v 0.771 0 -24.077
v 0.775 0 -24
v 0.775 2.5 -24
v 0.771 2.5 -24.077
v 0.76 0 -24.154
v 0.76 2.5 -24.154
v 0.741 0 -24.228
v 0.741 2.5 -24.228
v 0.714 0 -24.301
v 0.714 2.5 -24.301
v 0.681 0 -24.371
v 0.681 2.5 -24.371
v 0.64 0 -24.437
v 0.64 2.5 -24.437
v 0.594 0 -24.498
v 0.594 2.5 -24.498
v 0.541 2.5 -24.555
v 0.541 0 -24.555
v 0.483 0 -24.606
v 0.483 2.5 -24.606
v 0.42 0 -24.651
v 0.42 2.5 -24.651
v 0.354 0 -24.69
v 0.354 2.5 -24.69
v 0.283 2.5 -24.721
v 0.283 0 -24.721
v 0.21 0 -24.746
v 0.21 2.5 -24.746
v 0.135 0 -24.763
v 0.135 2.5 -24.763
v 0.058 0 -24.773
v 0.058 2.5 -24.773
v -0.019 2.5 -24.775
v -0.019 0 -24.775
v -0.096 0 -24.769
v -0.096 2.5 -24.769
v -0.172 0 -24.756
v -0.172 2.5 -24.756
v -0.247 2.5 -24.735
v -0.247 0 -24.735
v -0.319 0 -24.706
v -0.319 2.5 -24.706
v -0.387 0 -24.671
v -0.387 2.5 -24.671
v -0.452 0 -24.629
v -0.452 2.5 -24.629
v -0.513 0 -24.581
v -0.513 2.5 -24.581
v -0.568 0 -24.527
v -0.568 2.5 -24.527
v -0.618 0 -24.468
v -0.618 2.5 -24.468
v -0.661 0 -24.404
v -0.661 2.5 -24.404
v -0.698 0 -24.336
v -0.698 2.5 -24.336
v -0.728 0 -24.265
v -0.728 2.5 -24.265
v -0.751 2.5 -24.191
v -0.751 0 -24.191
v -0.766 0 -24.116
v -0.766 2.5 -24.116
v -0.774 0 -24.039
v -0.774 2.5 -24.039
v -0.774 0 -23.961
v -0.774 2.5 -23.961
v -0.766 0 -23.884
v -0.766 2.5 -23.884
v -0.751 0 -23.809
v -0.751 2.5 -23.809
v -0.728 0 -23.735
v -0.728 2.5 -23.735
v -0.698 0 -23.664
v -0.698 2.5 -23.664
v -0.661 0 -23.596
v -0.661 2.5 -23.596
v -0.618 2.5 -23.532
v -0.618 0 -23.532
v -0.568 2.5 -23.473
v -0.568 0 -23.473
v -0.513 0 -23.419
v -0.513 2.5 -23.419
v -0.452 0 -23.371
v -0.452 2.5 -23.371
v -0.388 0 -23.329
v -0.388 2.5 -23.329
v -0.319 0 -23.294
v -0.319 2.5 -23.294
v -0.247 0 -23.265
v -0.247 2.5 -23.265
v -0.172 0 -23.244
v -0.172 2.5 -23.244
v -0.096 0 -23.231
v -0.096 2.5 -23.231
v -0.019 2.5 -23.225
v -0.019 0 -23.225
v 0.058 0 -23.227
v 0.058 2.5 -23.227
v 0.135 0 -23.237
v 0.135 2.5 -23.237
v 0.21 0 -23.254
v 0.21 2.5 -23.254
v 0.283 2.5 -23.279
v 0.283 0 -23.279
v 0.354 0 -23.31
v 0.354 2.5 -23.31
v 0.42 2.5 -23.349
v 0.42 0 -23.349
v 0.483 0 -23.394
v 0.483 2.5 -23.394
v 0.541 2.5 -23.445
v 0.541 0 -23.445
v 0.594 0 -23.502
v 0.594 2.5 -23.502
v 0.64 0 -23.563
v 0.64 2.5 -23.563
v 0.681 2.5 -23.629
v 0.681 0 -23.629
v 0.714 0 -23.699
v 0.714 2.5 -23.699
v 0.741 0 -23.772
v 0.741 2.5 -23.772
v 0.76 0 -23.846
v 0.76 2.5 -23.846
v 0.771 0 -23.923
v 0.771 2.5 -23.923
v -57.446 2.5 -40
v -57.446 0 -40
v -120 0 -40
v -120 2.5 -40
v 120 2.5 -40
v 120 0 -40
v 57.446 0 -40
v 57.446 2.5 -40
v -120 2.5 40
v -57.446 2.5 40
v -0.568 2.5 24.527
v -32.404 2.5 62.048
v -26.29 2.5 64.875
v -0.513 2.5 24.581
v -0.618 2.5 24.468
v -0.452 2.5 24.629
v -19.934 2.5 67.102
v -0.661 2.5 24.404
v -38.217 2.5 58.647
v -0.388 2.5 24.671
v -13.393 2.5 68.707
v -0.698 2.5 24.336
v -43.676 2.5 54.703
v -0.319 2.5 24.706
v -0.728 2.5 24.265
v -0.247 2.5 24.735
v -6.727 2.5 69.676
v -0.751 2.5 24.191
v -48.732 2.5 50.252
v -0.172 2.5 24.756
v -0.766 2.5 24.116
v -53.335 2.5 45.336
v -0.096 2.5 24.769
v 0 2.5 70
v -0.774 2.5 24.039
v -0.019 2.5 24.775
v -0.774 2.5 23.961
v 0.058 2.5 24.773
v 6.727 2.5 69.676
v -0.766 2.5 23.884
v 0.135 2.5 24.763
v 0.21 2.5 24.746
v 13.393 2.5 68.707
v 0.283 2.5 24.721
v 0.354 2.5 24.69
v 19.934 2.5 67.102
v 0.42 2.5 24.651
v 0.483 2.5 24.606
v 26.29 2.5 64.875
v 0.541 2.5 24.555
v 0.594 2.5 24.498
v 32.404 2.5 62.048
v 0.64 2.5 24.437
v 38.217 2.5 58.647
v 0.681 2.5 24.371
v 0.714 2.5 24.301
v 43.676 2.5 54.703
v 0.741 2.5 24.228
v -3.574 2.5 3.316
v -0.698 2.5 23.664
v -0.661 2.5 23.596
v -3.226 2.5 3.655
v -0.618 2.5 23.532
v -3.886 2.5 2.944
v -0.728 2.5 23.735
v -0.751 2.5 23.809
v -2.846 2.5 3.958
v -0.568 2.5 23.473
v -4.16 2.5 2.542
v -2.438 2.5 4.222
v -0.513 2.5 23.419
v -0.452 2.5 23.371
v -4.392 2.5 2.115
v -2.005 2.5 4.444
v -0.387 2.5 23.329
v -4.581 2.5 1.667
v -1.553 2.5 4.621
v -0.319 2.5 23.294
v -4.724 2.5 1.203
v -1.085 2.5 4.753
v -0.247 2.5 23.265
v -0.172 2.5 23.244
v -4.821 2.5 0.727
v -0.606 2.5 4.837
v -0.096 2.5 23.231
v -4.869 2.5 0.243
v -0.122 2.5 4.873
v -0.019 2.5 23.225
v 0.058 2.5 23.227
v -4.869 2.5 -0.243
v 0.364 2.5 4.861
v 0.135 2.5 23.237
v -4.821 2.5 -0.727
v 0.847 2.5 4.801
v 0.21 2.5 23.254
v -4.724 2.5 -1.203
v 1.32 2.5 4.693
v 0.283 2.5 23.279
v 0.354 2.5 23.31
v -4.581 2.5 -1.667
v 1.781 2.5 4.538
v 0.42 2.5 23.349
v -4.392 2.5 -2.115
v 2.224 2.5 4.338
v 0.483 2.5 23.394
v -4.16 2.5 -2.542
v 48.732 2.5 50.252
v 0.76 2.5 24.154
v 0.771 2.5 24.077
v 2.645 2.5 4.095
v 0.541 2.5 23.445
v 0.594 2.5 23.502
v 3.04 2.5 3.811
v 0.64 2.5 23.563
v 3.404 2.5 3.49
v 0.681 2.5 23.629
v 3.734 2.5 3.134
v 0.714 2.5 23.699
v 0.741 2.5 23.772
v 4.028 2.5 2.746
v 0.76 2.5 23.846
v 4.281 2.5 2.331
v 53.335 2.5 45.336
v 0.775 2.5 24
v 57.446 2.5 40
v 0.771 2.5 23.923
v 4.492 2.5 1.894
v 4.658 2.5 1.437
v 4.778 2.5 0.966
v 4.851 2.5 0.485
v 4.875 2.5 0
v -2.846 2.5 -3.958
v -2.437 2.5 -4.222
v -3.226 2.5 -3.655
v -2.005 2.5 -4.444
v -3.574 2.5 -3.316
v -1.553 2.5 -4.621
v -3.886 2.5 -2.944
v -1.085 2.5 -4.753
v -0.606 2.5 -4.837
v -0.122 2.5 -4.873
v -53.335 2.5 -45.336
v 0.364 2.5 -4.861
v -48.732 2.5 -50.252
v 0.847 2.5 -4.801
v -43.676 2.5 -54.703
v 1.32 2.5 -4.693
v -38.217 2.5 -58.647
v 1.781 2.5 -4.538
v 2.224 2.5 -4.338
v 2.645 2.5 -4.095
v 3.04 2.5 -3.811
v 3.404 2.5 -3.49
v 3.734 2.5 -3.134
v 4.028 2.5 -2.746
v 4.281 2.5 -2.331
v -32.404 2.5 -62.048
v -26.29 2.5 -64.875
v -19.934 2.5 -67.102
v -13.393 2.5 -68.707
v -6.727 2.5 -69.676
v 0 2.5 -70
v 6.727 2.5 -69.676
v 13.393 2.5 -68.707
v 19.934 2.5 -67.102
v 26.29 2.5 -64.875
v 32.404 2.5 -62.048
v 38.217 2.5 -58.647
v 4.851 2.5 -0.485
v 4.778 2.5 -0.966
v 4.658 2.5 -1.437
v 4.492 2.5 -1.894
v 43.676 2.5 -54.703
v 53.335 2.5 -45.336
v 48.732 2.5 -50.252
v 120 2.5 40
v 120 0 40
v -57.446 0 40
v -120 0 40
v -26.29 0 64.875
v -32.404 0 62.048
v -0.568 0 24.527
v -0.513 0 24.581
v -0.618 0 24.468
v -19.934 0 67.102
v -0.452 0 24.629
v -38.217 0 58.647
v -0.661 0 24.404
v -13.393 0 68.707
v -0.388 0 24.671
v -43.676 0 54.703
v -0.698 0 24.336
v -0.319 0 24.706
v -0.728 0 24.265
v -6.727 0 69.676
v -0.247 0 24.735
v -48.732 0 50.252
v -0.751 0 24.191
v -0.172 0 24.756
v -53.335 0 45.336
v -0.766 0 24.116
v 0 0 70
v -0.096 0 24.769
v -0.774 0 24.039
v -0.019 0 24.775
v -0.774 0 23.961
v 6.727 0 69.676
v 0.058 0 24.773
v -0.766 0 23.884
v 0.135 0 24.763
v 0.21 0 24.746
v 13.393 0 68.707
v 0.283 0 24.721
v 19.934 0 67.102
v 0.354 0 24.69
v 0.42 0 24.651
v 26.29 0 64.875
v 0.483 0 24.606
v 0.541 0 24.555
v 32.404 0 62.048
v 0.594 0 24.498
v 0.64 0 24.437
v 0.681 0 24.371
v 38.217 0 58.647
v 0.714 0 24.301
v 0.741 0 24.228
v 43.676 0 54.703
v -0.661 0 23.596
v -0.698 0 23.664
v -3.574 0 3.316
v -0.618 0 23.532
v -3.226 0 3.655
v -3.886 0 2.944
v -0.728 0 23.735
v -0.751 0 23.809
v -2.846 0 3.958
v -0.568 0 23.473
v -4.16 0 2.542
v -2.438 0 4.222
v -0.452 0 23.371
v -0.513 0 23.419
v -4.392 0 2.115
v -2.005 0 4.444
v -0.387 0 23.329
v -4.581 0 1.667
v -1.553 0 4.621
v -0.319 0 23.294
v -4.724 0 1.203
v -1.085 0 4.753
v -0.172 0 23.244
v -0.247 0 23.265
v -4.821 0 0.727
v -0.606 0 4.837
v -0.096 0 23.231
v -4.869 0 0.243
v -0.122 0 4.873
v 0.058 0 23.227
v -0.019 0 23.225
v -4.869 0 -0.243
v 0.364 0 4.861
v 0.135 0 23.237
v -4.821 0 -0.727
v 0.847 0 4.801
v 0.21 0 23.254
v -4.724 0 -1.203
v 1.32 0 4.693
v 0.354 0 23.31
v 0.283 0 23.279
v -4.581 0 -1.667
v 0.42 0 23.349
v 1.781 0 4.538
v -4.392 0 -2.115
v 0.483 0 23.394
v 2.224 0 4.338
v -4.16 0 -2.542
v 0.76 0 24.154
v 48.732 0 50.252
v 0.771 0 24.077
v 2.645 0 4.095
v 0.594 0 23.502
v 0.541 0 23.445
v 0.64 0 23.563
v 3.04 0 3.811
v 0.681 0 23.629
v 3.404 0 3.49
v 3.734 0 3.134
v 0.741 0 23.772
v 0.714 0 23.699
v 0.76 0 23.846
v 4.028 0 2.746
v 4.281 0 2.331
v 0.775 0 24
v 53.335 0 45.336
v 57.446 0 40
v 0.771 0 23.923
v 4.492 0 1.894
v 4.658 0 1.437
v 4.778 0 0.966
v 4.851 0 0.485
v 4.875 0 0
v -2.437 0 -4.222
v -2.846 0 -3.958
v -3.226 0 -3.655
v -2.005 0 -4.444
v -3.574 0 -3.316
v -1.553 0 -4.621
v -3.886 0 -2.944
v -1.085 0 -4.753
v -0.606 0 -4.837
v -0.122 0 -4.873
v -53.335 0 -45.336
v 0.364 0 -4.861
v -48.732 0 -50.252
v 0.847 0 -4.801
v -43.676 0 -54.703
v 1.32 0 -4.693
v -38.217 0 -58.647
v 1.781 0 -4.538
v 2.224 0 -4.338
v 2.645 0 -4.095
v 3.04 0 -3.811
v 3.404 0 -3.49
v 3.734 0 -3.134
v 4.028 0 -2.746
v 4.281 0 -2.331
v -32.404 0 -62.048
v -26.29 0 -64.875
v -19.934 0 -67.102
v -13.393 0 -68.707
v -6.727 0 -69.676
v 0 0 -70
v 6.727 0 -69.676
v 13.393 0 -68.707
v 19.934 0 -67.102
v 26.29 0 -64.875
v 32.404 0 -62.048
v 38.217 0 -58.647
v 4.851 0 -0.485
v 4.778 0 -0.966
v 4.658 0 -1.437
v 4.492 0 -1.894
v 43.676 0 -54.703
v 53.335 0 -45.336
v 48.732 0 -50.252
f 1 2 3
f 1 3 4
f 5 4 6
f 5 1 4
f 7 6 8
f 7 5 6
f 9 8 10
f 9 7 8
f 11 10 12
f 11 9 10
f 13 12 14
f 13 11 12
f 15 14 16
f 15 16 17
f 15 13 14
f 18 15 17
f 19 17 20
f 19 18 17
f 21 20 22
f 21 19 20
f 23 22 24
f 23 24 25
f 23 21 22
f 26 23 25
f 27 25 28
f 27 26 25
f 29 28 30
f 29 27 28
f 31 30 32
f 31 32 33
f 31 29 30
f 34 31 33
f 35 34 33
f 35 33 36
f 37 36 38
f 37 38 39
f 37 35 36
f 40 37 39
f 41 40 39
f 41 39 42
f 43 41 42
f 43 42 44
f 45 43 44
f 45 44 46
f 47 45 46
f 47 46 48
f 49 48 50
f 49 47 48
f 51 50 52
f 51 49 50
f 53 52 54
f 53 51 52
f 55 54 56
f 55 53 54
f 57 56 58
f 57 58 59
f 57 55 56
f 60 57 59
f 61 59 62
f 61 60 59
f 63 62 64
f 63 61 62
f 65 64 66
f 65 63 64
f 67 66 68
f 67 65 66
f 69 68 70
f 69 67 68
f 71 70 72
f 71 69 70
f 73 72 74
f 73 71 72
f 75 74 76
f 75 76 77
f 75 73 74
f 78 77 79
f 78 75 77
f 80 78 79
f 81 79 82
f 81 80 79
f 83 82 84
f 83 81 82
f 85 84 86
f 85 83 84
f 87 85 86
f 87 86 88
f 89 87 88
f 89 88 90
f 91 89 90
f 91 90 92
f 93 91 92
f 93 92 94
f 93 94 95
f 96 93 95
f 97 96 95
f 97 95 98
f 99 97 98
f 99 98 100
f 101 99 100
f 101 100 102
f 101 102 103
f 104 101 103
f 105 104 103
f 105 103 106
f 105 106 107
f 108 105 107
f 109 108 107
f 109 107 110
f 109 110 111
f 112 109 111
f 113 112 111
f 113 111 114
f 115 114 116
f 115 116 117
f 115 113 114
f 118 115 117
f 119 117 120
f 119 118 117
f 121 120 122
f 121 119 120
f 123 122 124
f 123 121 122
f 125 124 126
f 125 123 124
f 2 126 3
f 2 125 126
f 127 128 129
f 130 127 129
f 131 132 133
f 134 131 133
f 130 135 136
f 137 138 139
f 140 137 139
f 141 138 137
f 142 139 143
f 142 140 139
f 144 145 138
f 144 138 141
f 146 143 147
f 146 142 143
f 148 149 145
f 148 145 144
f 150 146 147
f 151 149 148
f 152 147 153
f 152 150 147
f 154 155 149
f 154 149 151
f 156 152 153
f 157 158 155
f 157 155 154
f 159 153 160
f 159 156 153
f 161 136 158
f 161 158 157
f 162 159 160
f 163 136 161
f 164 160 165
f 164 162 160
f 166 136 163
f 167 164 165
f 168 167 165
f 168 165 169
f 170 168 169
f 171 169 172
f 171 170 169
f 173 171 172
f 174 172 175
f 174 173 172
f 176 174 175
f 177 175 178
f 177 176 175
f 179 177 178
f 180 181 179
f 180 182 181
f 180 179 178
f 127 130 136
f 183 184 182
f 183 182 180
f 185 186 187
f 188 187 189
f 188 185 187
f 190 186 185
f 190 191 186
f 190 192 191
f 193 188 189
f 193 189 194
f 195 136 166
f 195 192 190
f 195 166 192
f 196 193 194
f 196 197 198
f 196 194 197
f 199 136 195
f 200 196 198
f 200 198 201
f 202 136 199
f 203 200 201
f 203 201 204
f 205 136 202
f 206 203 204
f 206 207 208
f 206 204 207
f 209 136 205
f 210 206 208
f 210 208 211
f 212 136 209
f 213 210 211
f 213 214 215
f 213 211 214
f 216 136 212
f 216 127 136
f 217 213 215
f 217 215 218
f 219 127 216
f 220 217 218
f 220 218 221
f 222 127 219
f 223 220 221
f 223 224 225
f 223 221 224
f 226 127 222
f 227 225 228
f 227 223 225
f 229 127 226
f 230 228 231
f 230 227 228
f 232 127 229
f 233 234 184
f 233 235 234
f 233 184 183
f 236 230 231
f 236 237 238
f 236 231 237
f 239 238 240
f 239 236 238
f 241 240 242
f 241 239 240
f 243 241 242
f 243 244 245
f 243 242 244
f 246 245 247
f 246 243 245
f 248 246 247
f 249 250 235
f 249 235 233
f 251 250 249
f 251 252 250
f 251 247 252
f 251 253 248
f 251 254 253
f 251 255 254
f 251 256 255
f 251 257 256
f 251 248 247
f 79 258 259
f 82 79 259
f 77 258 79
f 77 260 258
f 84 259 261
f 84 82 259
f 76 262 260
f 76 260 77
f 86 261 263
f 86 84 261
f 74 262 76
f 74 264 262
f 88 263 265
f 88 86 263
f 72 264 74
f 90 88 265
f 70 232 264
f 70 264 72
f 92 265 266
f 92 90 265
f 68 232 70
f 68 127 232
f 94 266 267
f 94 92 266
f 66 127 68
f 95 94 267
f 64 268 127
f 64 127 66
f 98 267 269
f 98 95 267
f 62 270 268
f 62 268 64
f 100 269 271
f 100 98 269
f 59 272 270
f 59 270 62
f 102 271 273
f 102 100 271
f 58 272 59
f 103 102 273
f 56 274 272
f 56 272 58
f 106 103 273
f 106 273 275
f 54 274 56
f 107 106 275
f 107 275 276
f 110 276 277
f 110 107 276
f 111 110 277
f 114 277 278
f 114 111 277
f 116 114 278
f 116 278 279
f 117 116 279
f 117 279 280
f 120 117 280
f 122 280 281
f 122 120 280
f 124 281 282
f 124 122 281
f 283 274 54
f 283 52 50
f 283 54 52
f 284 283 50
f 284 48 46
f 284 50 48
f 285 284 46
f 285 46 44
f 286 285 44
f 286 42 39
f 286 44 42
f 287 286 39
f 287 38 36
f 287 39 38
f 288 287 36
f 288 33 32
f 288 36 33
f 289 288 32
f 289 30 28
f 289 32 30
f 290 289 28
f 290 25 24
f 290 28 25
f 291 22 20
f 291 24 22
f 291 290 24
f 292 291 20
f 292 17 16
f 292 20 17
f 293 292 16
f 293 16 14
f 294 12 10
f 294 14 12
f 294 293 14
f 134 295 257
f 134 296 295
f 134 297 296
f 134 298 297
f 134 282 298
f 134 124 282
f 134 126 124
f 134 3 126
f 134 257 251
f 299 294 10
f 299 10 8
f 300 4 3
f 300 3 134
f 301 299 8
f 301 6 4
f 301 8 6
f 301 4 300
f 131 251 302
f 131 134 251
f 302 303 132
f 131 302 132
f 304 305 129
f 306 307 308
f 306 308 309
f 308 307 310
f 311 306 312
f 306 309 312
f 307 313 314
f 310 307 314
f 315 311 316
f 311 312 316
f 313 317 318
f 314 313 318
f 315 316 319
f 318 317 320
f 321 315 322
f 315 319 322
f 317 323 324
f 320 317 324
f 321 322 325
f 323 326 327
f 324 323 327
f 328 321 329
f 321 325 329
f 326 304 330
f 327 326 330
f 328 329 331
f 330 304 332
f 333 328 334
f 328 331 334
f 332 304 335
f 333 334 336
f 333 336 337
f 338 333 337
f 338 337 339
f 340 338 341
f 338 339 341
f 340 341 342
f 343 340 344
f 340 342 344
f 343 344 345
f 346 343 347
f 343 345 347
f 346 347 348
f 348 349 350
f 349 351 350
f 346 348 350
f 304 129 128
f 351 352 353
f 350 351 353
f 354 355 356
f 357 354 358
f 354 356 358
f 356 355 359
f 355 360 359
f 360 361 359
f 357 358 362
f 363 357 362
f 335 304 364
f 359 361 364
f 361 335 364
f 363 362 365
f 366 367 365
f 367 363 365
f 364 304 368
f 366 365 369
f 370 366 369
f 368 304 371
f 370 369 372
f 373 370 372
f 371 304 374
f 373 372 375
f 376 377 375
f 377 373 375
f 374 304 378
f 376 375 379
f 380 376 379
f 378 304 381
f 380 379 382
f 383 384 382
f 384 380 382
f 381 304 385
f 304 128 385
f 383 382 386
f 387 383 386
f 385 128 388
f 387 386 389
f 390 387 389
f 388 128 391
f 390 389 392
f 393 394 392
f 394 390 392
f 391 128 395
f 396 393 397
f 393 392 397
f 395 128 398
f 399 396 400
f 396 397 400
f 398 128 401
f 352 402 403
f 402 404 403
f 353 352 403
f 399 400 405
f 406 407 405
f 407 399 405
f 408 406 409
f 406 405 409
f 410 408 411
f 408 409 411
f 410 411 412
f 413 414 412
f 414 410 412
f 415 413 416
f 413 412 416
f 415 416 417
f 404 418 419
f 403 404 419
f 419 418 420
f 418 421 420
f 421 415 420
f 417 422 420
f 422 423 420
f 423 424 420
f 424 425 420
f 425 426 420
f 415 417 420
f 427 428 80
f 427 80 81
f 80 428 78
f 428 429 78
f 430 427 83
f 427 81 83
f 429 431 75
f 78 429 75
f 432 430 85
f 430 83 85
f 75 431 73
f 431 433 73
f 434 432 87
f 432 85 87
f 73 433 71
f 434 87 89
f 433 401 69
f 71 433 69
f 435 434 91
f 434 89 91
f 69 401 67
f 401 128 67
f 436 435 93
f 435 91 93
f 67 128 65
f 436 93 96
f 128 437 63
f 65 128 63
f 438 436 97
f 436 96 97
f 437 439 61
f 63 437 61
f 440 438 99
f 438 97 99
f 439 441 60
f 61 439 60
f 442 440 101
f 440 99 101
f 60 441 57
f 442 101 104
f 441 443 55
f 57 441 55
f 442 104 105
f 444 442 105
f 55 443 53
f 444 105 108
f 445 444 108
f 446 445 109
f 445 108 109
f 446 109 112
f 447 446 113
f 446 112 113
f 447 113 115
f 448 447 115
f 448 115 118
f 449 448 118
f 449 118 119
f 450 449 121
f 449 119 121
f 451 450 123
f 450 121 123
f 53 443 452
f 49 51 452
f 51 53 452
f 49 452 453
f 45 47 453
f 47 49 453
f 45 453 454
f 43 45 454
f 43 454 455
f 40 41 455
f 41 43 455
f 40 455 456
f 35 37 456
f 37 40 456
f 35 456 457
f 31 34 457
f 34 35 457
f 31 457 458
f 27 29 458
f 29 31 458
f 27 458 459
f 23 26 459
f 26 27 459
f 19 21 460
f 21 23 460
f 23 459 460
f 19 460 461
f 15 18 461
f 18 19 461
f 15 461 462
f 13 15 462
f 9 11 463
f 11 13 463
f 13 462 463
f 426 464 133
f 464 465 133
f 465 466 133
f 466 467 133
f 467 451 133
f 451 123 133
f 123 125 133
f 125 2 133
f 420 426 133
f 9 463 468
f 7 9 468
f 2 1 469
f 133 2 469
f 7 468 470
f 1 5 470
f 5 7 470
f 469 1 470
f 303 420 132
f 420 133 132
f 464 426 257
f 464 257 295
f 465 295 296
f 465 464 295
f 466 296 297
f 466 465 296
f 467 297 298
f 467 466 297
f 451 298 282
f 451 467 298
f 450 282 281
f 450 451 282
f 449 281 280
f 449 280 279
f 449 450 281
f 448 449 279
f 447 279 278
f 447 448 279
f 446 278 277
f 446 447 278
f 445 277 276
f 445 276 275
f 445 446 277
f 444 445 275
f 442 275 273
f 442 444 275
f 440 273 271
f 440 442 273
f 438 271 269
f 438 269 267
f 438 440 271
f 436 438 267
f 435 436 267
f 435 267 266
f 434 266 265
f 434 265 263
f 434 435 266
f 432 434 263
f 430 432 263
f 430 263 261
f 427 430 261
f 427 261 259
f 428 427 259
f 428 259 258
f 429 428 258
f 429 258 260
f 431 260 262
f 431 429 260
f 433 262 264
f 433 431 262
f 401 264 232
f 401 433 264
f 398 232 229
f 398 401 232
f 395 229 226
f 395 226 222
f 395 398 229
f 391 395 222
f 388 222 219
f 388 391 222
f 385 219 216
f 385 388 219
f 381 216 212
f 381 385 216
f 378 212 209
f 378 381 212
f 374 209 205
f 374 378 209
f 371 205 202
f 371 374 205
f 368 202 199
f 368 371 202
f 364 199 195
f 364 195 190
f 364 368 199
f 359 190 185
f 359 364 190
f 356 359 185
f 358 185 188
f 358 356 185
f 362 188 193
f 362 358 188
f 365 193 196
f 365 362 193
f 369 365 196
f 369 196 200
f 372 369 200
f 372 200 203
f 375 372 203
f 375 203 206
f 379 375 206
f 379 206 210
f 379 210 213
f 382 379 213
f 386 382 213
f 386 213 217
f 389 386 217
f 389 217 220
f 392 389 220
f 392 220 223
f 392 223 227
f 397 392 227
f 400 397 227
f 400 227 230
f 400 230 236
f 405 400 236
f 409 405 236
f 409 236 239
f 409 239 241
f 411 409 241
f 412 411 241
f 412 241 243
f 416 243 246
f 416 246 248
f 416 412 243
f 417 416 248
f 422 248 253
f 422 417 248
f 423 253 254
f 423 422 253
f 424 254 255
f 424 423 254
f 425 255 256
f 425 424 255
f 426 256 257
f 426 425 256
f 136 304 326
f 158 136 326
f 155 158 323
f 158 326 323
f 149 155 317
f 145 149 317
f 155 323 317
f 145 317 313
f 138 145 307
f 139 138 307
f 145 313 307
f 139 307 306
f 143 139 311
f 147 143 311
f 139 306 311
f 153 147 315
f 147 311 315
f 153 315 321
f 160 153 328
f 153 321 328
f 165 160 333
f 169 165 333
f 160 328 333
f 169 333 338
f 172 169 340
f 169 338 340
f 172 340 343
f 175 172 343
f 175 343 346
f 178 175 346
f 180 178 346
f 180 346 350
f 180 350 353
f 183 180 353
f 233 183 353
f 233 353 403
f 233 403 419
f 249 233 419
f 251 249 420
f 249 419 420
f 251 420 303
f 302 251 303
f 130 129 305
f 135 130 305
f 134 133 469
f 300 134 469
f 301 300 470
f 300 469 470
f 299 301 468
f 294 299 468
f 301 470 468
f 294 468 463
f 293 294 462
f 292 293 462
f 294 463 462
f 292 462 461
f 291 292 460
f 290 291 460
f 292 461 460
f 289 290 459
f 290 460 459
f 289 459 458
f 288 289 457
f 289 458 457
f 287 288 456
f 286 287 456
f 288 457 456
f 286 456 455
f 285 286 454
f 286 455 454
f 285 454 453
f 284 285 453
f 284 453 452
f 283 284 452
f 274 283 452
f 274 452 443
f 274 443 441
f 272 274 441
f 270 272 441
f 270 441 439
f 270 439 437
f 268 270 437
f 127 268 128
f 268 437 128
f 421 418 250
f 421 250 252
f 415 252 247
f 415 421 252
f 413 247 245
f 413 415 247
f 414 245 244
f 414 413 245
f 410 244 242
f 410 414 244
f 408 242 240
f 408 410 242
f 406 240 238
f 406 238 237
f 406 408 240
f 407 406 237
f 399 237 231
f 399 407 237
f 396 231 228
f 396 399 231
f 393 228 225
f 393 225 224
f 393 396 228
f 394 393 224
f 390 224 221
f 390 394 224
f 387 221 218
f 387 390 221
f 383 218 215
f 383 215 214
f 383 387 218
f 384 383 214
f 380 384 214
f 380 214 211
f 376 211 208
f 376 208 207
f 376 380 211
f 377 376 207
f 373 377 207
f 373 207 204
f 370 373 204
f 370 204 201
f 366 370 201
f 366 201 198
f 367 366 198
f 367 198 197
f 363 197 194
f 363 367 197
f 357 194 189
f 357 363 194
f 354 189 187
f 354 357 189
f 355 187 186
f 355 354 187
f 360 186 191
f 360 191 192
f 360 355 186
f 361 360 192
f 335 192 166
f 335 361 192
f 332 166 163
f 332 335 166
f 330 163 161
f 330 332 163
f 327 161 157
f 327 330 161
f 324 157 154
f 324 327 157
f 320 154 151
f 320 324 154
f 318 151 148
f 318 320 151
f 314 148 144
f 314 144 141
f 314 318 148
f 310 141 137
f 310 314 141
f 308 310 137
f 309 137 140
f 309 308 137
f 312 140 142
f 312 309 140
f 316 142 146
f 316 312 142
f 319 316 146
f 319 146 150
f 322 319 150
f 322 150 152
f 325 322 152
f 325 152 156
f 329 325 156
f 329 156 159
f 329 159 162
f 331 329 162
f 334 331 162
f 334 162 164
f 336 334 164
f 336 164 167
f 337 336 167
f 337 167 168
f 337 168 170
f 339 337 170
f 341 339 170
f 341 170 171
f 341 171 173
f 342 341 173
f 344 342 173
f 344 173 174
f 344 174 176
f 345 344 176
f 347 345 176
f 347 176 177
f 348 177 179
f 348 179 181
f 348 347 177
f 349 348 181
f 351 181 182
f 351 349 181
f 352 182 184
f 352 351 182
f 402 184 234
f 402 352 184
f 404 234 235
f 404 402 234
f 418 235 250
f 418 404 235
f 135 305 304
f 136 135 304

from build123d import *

# Parameters (mm, degrees)
SKETCH2_R           = 0.775
SKETCH2_R_2         = 4.875
BOSS_EXTRUDE1_DEPTH = 2.5


with BuildPart() as part:
    # Sketch2 → Boss-Extrude1 (new body)
    with BuildSketch(Plane(origin=(0, 0, 0), x_dir=(1, 0, 0), z_dir=(0, 1, 0))):
        with BuildLine():
            Line((-57.445626465, 40), (-120, 40))
            Line((-120, 40), (-120, -40))
            Line((-120, -40), (-57.445626465, -40))
            ThreePointArc((-57.445626465, -40), (0, -70), (57.445626465, -40))
            Line((57.445626465, -40), (120, -40))
            Line((120, -40), (120, 40))
            Line((120, 40), (57.445626465, 40))
            ThreePointArc((57.445626465, 40), (0, 70), (-57.445626465, 40))
        make_face()
        with Locations((0, 24)):
            Circle(SKETCH2_R, mode=Mode.SUBTRACT)
        with Locations((0, -24)):
            Circle(SKETCH2_R, mode=Mode.SUBTRACT)
        Circle(SKETCH2_R_2, mode=Mode.SUBTRACT)
    extrude(amount=BOSS_EXTRUDE1_DEPTH)


solid = part.part
